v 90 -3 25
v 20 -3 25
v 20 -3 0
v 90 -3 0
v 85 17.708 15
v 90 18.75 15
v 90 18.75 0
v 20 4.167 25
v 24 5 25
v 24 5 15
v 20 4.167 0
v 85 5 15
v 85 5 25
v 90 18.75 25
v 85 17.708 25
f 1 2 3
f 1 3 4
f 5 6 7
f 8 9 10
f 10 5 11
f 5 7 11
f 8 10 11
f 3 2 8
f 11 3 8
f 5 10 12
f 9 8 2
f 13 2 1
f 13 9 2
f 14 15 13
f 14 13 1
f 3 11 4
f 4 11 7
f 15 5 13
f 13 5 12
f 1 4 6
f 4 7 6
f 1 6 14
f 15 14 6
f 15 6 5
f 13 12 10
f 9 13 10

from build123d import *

# Parameters (mm, degrees)
F1_DEPTH  = 15
F3_DEPTH  = 10
F3_FACE_W = 90
F3_FACE_H = 25
F4_DEPTH  = 3
F6_DEPTH  = 25


with BuildPart() as f1:
    # F0 (on Top) → F1 (new body)
    with BuildSketch(Plane.XY):
        Polygon((60, 12.5), (0, 0), (60, 0), align=None)
        Polygon((60, 12.5), (60, 0), (90, 0), (90, 18.75), align=None)
    extrude(amount=F1_DEPTH)

    # F2 (on face) → F3 (join)
    with BuildSketch(Plane.XY.offset(15)):
        Polygon((0, 0), (90, 0), (90, 18.75), (85.000001, 17.708334), (85.000001, 5), (24, 5), align=None)
    extrude(amount=F3_DEPTH)

    # F3_face (on face) → F4 (join)
    with BuildSketch(Plane(origin=(45, 0, 12.5), x_dir=(1, 0, 0), z_dir=(0, -1, 0))):
        Rectangle(F3_FACE_W, F3_FACE_H)
    extrude(amount=F4_DEPTH)

    # F5 (on face) → F6 (cut, through all)
    with BuildSketch(Plane.XY.offset(25)):
        Polygon((0, -3), (20, -3), (20, 4.166667), (0, 0), align=None)
    extrude(amount=-F6_DEPTH, mode=Mode.SUBTRACT)


solid = f1.part
